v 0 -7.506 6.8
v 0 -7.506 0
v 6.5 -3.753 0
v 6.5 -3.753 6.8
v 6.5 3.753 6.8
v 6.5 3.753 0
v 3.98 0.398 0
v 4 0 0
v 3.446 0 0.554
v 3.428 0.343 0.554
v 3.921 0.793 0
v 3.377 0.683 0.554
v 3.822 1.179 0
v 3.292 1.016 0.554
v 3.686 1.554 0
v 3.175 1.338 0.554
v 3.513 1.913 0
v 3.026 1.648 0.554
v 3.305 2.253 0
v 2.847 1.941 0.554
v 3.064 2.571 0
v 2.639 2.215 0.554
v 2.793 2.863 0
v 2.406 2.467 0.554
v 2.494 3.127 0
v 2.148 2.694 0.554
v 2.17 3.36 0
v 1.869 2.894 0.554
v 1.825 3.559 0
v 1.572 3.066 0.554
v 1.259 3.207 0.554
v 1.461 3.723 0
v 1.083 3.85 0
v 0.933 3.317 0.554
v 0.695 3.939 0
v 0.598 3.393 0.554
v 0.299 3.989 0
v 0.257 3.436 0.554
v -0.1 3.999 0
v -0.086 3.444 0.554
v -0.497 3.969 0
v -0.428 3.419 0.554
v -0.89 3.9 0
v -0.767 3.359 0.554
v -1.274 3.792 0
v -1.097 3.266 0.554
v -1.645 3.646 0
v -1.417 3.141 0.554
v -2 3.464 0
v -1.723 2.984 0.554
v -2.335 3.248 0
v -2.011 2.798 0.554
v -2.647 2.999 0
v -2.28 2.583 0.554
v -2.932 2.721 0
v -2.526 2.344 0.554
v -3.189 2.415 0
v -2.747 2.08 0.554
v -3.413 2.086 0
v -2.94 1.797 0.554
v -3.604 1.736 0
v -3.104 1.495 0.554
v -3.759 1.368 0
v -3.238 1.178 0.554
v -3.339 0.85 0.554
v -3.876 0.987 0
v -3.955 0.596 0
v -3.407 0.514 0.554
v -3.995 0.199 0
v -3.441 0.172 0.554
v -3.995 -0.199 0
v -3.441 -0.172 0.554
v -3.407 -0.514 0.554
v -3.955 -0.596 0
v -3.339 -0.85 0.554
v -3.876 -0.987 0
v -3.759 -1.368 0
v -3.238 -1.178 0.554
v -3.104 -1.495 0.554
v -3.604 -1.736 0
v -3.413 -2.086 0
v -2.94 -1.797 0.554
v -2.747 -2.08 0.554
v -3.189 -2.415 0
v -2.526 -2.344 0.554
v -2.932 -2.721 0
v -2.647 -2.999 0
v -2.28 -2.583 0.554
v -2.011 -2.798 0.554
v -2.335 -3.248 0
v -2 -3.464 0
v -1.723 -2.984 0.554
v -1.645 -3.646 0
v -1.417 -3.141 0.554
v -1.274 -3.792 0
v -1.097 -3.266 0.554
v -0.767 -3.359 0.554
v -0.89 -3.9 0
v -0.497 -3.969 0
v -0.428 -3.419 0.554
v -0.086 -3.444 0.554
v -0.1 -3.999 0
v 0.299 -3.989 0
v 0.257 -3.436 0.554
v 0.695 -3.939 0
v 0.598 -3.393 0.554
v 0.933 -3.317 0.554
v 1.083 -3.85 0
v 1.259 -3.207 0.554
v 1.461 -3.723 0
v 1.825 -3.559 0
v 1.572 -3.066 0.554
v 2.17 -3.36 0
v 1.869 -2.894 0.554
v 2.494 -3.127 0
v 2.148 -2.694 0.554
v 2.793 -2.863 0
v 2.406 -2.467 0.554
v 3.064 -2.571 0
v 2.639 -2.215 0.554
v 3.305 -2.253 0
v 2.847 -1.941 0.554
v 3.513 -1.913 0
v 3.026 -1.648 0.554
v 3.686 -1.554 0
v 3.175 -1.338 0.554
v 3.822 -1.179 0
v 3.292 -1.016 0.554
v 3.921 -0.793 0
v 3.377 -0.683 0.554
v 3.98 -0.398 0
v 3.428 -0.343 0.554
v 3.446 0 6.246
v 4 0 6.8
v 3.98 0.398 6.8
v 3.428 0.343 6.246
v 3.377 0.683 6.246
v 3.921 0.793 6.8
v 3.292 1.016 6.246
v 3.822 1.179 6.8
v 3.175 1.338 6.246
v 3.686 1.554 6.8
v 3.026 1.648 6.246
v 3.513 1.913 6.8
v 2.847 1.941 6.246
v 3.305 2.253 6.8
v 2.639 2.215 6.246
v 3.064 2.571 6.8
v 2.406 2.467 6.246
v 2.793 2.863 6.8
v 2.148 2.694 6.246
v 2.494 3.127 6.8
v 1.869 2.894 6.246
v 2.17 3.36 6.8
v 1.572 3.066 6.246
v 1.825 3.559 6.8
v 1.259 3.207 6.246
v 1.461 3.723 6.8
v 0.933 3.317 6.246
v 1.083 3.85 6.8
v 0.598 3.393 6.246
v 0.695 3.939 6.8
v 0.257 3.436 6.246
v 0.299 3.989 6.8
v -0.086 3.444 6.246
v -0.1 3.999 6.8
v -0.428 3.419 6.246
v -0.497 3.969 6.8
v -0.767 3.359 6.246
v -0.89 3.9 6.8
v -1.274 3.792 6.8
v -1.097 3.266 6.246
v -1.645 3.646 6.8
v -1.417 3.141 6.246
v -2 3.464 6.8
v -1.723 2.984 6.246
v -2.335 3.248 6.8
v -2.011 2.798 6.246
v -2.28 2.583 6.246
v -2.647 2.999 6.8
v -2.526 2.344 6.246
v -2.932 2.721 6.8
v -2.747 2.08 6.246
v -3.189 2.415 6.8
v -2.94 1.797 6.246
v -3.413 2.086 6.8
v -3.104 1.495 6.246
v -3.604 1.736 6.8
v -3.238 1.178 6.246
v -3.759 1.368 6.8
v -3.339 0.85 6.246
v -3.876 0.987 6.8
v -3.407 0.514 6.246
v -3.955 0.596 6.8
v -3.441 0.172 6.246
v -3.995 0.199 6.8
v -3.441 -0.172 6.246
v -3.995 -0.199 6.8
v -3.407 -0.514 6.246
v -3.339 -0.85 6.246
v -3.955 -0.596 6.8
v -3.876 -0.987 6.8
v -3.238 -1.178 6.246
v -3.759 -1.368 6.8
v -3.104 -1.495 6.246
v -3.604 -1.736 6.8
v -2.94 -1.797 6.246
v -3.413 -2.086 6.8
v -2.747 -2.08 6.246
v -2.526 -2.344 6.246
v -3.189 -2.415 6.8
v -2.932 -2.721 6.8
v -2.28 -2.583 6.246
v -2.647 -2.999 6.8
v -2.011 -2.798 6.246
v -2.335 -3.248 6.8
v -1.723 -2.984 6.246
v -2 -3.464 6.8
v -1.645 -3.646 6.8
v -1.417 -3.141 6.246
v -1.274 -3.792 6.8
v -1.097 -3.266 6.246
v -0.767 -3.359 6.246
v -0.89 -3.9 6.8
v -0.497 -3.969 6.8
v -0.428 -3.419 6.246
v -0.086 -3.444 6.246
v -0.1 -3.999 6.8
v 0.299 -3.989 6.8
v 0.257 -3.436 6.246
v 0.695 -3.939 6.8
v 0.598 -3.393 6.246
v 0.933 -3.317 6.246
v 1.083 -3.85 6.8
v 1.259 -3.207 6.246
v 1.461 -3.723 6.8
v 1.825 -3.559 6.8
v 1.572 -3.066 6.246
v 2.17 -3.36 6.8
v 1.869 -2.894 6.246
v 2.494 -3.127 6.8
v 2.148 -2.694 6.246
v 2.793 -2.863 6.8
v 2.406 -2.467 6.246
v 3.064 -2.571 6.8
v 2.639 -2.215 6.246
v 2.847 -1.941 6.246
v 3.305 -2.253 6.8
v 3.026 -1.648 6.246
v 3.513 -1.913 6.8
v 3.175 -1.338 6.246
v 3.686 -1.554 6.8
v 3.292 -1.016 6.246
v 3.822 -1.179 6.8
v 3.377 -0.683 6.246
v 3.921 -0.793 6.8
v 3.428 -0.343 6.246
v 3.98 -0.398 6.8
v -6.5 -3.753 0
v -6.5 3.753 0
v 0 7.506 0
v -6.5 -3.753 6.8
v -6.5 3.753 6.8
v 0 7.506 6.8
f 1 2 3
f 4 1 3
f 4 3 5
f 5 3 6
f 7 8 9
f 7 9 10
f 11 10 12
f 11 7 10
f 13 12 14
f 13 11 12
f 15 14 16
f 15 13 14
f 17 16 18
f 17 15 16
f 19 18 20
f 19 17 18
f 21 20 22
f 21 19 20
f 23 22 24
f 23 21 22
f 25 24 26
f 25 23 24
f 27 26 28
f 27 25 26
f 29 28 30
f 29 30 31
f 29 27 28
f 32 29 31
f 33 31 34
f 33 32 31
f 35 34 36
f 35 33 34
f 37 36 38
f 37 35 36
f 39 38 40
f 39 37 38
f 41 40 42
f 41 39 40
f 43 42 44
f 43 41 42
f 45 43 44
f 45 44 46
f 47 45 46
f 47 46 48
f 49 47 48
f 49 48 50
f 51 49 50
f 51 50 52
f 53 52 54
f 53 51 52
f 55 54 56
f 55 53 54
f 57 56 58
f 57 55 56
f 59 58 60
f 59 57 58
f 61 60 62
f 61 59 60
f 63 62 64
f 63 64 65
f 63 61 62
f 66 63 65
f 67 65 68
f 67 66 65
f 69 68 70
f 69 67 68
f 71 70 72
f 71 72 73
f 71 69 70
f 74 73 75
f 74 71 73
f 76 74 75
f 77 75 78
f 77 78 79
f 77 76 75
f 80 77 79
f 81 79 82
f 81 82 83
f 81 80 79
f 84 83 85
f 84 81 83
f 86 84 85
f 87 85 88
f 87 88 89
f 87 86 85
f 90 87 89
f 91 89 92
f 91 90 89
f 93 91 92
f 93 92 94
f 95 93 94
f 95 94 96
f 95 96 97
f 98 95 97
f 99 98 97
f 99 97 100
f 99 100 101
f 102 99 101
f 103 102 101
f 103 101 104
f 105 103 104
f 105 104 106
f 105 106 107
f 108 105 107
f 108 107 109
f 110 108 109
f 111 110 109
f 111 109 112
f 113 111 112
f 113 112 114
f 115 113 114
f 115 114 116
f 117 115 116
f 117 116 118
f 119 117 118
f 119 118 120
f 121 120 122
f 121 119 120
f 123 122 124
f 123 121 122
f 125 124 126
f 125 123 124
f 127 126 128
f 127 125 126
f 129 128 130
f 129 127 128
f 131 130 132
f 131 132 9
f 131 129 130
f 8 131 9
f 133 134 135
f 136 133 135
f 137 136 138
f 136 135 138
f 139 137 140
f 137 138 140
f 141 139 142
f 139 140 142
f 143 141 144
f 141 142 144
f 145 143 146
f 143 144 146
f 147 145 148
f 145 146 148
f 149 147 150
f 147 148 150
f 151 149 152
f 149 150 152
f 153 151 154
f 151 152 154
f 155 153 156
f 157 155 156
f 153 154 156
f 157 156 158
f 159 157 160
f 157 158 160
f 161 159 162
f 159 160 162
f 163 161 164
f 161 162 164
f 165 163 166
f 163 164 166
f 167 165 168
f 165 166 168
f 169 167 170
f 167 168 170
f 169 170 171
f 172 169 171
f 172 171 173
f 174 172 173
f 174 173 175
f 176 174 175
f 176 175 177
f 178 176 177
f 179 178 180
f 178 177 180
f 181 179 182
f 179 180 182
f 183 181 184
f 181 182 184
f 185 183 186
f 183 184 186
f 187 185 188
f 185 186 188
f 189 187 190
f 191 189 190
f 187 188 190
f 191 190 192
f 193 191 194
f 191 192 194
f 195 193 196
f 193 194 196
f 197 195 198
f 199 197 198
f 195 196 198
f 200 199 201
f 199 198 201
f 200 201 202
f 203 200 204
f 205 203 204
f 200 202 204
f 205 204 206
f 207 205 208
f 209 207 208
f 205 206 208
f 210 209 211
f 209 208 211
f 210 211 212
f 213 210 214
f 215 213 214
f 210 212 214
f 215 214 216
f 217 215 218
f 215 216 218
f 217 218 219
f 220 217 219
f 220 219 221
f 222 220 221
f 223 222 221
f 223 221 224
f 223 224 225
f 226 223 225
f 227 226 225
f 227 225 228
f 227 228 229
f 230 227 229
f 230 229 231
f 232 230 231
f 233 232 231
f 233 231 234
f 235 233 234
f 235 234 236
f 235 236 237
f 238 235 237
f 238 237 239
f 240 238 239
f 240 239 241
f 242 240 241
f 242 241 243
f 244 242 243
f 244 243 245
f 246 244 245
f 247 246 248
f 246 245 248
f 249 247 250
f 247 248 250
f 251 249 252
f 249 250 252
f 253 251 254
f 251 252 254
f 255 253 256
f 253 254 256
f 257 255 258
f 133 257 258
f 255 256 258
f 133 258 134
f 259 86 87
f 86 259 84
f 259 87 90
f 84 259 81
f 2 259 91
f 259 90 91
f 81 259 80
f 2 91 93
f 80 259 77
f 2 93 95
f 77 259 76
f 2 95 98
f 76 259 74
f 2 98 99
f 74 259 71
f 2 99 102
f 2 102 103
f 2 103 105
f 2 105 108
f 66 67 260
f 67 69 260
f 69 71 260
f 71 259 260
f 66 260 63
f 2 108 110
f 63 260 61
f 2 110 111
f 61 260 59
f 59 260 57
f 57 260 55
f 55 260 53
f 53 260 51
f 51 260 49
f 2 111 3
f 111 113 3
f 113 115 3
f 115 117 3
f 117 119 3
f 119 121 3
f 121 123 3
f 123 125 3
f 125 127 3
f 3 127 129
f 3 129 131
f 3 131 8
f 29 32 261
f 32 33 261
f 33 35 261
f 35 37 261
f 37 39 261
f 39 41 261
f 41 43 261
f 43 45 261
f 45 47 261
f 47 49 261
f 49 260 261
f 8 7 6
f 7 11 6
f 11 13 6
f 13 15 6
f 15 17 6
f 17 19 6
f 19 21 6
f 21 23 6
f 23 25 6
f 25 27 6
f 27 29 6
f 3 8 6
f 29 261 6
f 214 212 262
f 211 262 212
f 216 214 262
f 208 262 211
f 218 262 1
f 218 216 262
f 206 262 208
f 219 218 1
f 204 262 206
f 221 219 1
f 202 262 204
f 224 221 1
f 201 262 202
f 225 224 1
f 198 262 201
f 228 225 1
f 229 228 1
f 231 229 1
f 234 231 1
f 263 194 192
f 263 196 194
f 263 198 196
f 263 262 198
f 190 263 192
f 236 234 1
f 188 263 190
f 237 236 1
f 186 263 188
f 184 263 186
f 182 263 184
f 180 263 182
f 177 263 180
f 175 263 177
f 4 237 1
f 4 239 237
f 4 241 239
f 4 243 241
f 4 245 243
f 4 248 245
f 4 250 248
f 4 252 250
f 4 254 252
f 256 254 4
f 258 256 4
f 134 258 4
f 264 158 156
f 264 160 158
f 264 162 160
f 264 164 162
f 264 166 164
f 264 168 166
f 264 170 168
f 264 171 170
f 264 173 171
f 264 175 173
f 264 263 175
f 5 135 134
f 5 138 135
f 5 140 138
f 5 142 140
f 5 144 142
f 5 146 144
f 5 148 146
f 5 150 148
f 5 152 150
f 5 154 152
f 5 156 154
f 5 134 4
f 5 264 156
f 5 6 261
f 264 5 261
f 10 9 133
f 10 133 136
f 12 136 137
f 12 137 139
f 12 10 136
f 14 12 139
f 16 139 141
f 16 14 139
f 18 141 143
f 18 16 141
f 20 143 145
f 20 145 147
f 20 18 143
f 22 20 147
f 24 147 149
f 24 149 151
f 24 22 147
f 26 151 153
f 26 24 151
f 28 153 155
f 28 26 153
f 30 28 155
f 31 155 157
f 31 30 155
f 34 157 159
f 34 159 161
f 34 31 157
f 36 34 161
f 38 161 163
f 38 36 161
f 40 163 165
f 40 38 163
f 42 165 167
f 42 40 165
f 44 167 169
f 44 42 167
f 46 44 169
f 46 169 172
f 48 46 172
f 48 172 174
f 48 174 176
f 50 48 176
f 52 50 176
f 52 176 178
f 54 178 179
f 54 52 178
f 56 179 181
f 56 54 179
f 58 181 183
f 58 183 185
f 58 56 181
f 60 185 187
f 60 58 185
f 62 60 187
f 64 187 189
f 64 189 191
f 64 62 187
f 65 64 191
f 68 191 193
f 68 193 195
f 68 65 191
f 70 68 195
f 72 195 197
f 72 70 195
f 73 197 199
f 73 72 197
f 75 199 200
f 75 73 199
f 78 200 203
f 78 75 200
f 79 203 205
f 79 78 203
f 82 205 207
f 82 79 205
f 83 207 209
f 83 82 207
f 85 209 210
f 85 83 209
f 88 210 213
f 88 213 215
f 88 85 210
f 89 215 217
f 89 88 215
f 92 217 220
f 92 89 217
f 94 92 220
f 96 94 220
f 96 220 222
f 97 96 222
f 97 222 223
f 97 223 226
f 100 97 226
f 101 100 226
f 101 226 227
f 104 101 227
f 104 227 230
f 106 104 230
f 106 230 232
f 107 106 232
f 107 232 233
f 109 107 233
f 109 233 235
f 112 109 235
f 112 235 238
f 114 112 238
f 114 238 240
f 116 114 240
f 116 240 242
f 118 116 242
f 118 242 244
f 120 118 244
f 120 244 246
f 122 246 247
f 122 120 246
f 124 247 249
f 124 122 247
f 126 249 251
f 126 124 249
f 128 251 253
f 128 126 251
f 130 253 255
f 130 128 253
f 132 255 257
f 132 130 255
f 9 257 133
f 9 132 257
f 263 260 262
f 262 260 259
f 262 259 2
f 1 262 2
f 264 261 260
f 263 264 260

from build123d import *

# Parameters (mm, degrees)
SKETCH_1_R      = 3.4455
EXTRUDE_1_DEPTH = 6.8
CHAMFER_1_SIZE  = 0.5545


with BuildPart() as part:
    # Эскиз1 → Бобышка-Вытянуть1 (new body)
    with BuildSketch(Plane.XY):
        Polygon((0, 7.505553499), (-6.5, 3.75277675), (-6.5, -3.75277675), (0, -7.505553499), (6.5, -3.75277675), (6.5, 3.75277675), align=None)
        Circle(SKETCH_1_R, mode=Mode.SUBTRACT)
    extrude(amount=EXTRUDE_1_DEPTH)

    # Фаска1
    chamfer_1_edges = [part.edges().sort_by_distance(p)[0] for p in [
        (-3.4455, 0, 0),
        (-3.4455, 0, 6.8),
    ]]
    chamfer(chamfer_1_edges, length=CHAMFER_1_SIZE)


solid = part.part
